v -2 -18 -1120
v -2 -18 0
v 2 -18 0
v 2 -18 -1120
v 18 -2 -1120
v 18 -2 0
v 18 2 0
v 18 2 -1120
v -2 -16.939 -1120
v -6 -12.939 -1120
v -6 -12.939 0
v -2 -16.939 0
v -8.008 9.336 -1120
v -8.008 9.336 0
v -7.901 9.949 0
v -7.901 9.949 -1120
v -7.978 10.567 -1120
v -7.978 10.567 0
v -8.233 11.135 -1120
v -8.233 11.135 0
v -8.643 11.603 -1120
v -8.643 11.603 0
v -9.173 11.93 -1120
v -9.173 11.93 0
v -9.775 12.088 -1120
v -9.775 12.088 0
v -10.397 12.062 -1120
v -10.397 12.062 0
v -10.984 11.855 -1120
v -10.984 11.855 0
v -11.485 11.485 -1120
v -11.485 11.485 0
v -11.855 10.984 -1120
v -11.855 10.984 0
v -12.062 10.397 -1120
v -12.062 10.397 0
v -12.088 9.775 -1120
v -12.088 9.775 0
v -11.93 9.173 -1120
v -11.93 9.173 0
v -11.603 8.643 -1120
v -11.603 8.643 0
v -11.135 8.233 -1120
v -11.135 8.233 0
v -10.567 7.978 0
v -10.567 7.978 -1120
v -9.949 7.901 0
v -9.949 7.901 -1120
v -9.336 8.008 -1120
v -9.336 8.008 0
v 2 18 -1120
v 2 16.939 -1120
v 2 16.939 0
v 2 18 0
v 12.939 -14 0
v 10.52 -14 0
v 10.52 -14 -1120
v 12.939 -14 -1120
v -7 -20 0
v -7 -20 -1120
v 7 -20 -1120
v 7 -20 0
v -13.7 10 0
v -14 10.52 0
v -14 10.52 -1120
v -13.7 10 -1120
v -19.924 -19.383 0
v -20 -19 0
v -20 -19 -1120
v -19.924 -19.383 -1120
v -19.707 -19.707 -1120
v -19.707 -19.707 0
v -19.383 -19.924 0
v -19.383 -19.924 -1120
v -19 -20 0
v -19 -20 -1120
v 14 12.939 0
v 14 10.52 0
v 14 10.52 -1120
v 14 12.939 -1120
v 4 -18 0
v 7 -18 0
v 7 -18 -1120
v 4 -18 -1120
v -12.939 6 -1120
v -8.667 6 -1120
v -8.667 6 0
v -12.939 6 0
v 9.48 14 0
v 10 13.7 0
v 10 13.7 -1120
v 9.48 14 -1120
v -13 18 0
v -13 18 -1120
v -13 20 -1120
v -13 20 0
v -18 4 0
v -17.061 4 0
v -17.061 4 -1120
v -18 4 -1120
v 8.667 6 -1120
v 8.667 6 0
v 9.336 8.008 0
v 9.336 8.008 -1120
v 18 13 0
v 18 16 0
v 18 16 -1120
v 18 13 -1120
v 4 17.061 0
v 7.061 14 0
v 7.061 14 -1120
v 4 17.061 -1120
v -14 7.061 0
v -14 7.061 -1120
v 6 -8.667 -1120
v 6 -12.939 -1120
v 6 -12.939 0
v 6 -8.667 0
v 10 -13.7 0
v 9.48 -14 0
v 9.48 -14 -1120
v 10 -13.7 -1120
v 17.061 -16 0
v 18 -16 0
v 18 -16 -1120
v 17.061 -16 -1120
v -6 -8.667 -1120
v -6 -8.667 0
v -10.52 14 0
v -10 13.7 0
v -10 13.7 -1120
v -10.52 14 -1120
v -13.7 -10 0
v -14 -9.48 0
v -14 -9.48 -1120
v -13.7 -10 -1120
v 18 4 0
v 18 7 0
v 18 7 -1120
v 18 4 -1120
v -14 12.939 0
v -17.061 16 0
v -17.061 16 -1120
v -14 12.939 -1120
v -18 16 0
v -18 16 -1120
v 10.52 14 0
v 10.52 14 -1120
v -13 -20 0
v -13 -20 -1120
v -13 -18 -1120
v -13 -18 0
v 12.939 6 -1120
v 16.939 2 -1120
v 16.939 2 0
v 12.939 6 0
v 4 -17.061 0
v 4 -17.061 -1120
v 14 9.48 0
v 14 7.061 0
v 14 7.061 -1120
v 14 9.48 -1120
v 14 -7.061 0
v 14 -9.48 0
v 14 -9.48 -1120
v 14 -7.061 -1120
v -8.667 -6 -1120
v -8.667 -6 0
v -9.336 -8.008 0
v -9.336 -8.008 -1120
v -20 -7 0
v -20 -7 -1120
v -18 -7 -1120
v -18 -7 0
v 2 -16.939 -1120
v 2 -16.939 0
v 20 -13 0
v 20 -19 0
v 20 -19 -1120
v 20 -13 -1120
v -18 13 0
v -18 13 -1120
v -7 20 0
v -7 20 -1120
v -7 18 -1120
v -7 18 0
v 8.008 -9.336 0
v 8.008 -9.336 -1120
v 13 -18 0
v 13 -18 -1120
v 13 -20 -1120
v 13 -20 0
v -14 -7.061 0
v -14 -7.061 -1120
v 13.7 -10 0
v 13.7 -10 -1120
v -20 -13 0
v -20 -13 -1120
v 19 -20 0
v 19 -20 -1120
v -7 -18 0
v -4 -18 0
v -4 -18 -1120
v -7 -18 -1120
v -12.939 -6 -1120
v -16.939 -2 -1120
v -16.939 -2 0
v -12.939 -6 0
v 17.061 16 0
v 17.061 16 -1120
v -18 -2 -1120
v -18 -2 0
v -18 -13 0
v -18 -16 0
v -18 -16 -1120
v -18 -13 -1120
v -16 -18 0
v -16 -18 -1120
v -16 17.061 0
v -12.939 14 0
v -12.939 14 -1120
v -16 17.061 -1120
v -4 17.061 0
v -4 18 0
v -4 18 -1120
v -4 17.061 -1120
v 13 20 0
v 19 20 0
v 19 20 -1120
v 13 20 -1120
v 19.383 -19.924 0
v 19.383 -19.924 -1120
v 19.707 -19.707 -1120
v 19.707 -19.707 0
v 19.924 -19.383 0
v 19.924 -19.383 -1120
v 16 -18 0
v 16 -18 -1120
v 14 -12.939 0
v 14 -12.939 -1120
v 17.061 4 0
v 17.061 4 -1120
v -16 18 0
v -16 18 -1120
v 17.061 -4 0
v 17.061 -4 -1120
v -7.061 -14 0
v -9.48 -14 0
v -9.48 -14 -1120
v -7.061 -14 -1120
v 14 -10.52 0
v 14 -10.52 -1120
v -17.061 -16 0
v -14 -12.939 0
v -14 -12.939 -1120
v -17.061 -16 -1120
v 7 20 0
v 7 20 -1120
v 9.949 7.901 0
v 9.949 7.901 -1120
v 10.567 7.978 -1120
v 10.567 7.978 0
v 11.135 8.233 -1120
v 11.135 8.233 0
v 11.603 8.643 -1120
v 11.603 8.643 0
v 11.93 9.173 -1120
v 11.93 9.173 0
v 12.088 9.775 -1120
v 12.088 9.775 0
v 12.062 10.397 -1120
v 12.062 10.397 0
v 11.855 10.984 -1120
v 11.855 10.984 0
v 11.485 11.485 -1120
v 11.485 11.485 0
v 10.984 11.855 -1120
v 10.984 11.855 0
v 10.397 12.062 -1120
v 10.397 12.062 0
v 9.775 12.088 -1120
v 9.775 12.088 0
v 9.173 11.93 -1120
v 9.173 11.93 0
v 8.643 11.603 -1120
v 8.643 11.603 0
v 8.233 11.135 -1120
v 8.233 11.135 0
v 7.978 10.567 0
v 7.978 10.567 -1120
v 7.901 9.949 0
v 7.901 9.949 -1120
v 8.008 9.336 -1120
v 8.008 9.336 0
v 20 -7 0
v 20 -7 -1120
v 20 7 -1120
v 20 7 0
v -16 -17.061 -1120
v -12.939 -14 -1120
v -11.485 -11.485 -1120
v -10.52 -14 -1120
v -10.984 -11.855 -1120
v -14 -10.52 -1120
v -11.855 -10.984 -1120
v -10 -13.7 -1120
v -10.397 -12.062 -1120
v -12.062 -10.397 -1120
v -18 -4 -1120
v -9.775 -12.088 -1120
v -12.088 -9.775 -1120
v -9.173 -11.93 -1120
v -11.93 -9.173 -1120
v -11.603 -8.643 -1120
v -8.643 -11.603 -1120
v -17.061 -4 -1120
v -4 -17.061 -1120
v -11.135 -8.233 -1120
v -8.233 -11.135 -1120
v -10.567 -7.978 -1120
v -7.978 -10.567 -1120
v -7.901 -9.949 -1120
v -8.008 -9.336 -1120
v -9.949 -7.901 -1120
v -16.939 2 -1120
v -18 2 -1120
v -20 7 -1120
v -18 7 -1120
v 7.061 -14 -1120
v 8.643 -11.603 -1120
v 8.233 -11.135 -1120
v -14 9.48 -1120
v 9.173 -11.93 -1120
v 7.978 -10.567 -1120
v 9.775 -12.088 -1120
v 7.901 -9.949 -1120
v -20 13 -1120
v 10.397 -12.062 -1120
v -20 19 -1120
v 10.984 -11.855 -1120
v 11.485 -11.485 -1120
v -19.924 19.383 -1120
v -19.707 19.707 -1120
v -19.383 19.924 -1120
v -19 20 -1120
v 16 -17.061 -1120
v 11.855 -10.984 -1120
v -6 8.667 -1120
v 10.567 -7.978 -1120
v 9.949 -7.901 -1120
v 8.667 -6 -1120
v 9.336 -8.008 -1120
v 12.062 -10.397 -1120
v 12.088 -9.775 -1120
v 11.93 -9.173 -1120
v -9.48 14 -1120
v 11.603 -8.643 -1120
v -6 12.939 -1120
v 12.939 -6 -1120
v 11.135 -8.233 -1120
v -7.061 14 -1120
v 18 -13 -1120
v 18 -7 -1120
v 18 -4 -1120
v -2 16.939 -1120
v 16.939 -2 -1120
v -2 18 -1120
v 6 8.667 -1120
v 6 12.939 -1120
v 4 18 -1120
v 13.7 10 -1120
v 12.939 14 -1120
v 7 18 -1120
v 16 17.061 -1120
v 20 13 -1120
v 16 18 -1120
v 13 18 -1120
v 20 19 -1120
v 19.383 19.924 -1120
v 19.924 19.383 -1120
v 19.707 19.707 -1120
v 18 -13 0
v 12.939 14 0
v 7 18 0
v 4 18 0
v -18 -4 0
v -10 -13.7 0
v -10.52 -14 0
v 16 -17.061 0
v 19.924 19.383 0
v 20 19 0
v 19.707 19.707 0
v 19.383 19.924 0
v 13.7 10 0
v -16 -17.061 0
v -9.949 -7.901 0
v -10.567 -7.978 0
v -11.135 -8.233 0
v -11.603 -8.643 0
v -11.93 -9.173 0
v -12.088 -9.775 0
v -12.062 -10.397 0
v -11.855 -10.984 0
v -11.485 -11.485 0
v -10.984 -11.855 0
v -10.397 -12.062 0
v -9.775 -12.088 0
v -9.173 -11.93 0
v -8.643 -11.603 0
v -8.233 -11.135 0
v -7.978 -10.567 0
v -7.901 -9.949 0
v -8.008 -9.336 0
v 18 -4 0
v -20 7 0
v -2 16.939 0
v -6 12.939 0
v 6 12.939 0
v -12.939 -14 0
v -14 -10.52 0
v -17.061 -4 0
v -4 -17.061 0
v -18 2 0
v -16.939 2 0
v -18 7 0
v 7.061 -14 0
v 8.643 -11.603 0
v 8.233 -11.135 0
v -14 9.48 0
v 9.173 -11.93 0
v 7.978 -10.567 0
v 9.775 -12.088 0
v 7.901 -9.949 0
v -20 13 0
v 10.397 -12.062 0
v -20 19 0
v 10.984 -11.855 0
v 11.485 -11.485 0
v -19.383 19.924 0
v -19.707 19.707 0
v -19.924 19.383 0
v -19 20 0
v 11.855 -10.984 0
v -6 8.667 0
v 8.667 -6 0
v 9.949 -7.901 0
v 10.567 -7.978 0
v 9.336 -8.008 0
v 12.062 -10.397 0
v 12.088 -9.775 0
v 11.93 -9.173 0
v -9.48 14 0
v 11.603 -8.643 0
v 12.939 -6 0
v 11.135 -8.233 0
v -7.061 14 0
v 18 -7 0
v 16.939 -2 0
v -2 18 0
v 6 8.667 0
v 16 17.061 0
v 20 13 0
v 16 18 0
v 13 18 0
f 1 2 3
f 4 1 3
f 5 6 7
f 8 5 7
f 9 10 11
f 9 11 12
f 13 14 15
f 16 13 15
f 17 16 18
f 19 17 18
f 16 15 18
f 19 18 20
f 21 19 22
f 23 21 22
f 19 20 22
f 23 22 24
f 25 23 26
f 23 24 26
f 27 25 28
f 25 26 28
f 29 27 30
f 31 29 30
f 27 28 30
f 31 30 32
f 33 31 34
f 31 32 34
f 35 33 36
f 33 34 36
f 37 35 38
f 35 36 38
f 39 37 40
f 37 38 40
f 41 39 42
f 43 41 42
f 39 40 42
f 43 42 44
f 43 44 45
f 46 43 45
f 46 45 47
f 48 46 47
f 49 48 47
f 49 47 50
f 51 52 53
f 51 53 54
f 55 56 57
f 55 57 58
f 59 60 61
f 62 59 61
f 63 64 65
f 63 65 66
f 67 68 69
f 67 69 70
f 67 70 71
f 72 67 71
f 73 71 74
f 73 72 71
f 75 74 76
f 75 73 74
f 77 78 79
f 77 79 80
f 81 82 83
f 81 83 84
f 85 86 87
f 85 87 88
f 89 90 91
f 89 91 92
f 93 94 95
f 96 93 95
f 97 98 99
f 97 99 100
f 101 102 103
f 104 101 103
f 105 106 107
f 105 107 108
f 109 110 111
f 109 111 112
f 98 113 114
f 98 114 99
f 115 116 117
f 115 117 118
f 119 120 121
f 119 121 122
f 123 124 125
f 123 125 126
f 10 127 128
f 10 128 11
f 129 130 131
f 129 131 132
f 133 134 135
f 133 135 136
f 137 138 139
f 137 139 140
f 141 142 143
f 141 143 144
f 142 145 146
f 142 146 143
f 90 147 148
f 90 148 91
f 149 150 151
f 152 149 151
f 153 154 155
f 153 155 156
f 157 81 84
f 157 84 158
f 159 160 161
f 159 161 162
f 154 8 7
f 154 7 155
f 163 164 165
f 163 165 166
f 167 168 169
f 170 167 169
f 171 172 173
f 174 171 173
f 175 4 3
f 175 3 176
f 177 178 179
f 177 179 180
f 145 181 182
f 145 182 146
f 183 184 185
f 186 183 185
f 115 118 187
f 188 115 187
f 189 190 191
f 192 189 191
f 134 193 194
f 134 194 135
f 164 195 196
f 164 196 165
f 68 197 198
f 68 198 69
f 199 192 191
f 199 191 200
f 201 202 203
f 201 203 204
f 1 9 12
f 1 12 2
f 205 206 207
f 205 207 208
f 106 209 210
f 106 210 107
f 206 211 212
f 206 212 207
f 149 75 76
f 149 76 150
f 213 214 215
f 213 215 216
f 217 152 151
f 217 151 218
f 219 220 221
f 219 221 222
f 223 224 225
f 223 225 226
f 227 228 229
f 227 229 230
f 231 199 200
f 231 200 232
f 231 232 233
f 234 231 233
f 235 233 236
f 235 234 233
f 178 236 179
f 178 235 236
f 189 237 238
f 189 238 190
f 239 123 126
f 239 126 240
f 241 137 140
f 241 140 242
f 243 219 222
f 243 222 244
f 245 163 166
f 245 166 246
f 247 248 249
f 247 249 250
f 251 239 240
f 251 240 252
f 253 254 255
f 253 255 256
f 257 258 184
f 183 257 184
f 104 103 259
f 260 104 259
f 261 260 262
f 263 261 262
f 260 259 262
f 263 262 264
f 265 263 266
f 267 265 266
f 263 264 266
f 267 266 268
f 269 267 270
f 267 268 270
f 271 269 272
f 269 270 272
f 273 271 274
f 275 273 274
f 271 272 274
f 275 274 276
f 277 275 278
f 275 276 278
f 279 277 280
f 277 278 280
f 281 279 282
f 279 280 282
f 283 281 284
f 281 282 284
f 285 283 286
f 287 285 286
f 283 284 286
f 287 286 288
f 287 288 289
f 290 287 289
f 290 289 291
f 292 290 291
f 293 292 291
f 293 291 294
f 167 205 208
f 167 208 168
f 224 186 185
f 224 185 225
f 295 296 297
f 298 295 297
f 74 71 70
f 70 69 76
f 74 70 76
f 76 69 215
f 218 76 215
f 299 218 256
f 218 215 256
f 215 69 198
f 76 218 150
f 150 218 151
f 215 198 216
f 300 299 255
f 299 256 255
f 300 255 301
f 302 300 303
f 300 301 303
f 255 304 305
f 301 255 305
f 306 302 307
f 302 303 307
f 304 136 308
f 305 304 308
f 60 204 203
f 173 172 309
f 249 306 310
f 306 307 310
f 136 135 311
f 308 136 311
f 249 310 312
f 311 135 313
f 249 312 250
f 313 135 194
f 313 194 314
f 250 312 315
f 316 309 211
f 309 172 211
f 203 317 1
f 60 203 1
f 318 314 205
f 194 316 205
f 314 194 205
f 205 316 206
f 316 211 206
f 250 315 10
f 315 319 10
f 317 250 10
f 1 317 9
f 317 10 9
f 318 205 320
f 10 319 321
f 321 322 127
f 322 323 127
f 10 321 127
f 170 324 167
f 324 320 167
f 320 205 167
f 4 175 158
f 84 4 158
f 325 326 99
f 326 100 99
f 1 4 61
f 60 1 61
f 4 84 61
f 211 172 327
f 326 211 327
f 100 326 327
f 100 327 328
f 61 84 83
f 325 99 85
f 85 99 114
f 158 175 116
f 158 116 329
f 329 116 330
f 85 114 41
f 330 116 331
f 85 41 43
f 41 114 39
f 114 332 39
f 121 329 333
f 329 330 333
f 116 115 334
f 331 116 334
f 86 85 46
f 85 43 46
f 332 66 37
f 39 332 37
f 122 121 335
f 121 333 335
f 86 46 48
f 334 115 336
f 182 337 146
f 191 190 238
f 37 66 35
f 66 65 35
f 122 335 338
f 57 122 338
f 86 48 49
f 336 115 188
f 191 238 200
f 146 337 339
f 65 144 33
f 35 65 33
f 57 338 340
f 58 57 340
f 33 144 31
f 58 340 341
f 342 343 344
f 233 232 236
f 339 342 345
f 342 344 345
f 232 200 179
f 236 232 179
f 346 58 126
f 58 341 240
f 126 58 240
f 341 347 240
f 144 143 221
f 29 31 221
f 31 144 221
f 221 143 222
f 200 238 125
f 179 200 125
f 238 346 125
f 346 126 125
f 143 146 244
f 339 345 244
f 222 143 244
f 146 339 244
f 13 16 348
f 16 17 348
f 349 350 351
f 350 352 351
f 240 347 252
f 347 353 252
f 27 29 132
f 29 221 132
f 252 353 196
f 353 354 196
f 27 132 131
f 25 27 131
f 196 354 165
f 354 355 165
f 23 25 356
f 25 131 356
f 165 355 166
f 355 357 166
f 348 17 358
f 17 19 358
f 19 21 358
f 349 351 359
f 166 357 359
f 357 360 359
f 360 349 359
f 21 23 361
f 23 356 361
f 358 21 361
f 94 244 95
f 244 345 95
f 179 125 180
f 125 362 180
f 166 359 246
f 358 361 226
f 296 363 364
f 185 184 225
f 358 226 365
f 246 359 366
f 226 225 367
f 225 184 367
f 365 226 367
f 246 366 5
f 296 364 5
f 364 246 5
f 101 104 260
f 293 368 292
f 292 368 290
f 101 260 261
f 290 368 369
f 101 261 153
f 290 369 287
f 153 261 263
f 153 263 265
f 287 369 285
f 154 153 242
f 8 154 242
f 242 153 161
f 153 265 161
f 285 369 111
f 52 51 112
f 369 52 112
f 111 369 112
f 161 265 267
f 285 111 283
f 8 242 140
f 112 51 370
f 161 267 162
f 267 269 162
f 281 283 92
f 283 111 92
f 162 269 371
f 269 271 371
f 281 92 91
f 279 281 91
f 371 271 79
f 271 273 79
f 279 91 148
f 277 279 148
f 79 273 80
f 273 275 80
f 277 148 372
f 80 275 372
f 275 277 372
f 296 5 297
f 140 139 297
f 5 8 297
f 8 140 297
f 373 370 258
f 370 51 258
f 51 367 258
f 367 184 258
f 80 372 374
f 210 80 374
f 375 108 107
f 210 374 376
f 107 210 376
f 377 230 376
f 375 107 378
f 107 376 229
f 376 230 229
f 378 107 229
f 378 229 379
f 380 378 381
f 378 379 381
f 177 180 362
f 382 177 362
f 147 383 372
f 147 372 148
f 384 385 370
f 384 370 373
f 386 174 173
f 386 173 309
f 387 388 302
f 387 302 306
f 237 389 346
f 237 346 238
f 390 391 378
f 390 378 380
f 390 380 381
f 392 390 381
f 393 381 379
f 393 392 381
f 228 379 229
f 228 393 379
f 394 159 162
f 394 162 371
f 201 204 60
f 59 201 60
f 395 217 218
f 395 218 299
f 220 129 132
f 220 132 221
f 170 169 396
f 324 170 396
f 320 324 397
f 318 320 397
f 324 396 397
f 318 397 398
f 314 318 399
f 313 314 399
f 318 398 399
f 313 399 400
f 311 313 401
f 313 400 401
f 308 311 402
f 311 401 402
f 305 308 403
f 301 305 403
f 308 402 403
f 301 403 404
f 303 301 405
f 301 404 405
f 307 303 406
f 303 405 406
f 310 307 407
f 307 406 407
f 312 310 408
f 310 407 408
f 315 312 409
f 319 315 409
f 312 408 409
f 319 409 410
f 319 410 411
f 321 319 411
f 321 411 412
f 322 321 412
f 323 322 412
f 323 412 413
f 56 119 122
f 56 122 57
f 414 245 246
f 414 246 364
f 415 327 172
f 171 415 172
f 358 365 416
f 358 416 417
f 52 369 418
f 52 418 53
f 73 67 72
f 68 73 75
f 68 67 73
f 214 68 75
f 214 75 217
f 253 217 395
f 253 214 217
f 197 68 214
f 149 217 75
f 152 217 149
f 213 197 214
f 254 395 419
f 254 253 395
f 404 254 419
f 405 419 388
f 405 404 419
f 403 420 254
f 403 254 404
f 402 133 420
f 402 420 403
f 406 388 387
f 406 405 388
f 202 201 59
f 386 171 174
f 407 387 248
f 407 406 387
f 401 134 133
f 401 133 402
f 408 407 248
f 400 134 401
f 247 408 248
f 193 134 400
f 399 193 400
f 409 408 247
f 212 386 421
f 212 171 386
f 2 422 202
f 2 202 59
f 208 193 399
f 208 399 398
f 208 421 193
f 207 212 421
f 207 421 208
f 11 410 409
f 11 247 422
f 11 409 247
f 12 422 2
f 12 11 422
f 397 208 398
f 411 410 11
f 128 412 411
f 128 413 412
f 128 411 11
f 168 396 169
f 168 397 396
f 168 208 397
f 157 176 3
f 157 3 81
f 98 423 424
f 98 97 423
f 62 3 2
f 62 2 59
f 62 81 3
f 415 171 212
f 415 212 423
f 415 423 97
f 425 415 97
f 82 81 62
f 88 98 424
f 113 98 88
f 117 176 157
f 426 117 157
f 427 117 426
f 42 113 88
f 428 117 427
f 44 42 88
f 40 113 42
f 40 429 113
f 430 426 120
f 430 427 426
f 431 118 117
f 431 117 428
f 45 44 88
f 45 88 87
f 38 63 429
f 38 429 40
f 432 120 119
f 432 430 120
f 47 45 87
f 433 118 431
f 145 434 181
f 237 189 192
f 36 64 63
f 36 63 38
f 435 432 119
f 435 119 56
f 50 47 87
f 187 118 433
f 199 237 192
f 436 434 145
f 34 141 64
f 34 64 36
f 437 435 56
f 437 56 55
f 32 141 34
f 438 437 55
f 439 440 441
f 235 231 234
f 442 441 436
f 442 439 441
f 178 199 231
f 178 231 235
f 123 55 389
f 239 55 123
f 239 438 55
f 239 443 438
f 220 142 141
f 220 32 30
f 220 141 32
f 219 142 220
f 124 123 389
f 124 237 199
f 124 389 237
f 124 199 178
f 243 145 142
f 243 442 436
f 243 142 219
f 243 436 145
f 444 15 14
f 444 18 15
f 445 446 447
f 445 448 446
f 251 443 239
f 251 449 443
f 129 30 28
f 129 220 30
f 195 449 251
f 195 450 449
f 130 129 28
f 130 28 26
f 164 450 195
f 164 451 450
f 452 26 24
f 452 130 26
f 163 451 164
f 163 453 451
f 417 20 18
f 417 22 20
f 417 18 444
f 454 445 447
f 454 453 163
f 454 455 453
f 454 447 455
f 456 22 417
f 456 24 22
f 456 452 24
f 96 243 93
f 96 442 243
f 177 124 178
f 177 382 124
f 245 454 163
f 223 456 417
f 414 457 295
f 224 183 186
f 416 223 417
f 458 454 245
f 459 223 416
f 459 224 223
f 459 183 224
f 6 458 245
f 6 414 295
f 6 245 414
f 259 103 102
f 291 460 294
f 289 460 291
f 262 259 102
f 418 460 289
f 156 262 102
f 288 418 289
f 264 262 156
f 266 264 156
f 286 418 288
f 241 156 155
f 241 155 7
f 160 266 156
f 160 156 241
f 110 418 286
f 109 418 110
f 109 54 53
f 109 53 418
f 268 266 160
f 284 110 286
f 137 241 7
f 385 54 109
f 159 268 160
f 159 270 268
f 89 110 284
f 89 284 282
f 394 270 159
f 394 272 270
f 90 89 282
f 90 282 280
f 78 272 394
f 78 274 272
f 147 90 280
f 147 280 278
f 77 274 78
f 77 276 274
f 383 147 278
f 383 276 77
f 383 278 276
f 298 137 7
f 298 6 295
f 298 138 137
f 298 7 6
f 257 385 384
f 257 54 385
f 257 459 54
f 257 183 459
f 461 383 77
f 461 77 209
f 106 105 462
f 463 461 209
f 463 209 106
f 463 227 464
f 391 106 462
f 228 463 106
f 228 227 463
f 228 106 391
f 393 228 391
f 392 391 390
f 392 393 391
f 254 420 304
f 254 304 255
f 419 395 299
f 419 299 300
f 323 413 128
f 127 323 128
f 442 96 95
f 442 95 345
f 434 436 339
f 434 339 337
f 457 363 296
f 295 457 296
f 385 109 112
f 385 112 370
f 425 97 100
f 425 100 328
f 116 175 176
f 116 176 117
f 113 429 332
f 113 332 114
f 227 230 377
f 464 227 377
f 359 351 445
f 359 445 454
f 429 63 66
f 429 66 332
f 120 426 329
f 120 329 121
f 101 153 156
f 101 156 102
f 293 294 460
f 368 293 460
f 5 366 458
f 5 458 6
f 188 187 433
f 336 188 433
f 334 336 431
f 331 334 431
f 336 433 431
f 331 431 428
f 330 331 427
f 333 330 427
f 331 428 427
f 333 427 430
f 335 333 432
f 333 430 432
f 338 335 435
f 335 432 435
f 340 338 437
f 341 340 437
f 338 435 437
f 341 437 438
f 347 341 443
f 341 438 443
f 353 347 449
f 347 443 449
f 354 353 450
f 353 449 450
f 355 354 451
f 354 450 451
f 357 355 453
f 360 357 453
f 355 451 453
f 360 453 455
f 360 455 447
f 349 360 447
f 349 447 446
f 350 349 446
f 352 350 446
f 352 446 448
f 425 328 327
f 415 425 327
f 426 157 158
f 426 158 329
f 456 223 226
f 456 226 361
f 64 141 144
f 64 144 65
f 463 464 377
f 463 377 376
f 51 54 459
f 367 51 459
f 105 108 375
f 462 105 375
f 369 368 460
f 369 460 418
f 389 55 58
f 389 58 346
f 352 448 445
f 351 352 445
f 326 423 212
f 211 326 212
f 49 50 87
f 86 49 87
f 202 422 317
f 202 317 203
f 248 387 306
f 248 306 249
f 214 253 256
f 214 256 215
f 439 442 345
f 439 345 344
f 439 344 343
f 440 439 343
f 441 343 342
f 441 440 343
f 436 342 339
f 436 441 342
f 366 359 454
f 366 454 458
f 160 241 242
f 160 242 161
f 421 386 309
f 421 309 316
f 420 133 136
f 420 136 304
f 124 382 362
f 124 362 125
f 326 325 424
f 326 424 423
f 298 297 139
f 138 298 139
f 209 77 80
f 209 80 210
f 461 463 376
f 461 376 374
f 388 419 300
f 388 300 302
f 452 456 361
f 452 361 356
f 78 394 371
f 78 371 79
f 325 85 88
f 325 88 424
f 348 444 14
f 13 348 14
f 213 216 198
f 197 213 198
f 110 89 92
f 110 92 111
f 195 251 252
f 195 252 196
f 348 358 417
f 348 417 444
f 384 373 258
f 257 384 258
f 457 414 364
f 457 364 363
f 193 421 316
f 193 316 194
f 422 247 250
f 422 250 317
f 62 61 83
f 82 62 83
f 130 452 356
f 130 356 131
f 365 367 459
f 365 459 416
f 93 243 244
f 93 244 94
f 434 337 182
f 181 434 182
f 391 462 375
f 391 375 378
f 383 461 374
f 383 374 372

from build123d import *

# Parameters (mm, degrees)
BOSS_EXTRUDE1_DEPTH = 1120
CUT_EXTRUDE1_DEPTH  = 1182


with BuildPart() as part:
    # Sketch1 → Boss-Extrude1 (new body)
    with BuildSketch(Plane.XY):
        with BuildLine():
            Line((-20, 13), (-18, 13))
            Line((-18, 13), (-18, 16))
            Line((-18, 16), (-17.060660172, 16))
            Line((-17.060660172, 16), (-14, 12.939339828))
            Line((-14, 12.939339828), (-14, 10.519615242))
            Line((-14, 10.519615242), (-13.7, 10))
            Line((-13.7, 10), (-14, 9.480384758))
            Line((-14, 9.480384758), (-14, 7.060660172))
            Line((-14, 7.060660172), (-17.060660172, 4))
            Line((-17.060660172, 4), (-18, 4))
            Line((-18, 4), (-18, 7))
            Line((-18, 7), (-20, 7))
            Line((-20, 7), (-20, -7))
            Line((-20, -7), (-18, -7))
            Line((-18, -7), (-18, -4))
            Line((-18, -4), (-17.060660172, -4))
            Line((-17.060660172, -4), (-14, -7.060660172))
            Line((-14, -7.060660172), (-14, -9.480384758))
            Line((-14, -9.480384758), (-13.7, -10))
            Line((-13.7, -10), (-14, -10.519615242))
            Line((-14, -10.519615242), (-14, -12.939339828))
            Line((-14, -12.939339828), (-17.060660172, -16))
            Line((-17.060660172, -16), (-18, -16))
            Line((-18, -16), (-18, -13))
            Line((-18, -13), (-20, -13))
            Line((-20, -13), (-20, -19))
            ThreePointArc((-20, -19), (-19.707106781, -19.707106781), (-19, -20))
            Line((-19, -20), (-13, -20))
            Line((-13, -20), (-13, -18))
            Line((-13, -18), (-16, -18))
            Line((-16, -18), (-16, -17.060660172))
            Line((-16, -17.060660172), (-12.939339828, -14))
            Line((-12.939339828, -14), (-10.519615242, -14))
            Line((-10.519615242, -14), (-10, -13.7))
            Line((-10, -13.7), (-9.480384758, -14))
            Line((-9.480384758, -14), (-7.060660172, -14))
            Line((-7.060660172, -14), (-4, -17.060660172))
            Line((-4, -17.060660172), (-4, -18))
            Line((-4, -18), (-7, -18))
            Line((-7, -18), (-7, -20))
            Line((-7, -20), (7, -20))
            Line((7, -20), (7, -18))
            Line((7, -18), (4, -18))
            Line((4, -18), (4, -17.060660172))
            Line((4, -17.060660172), (7.060660172, -14))
            Line((7.060660172, -14), (9.480384758, -14))
            Line((9.480384758, -14), (10, -13.7))
            Line((10, -13.7), (10.519615242, -14))
            Line((10.519615242, -14), (12.939339828, -14))
            Line((12.939339828, -14), (16, -17.060660172))
            Line((16, -17.060660172), (16, -18))
            Line((16, -18), (13, -18))
            Line((13, -18), (13, -20))
            Line((13, -20), (19, -20))
            ThreePointArc((19, -20), (19.707106781, -19.707106781), (20, -19))
            Line((20, -19), (20, -13))
            Line((20, -13), (18, -13))
            Line((18, -13), (18, -16))
            Line((18, -16), (17.060660172, -16))
            Line((17.060660172, -16), (14, -12.939339828))
            Line((14, -12.939339828), (14, -10.519615242))
            Line((14, -10.519615242), (13.7, -10))
            Line((13.7, -10), (14, -9.480384758))
            Line((14, -9.480384758), (14, -7.060660172))
            Line((14, -7.060660172), (17.060660172, -4))
            Line((17.060660172, -4), (18, -4))
            Line((18, -4), (18, -7))
            Line((18, -7), (20, -7))
            Line((20, -7), (20, 7))
            Line((20, 7), (18, 7))
            Line((18, 7), (18, 4))
            Line((18, 4), (17.060660172, 4))
            Line((17.060660172, 4), (14, 7.060660172))
            Line((14, 7.060660172), (14, 9.480384758))
            Line((14, 9.480384758), (13.7, 10))
            Line((13.7, 10), (14, 10.519615242))
            Line((14, 10.519615242), (14, 12.939339828))
            Line((14, 12.939339828), (17.060660172, 16))
            Line((17.060660172, 16), (18, 16))
            Line((18, 16), (18, 13))
            Line((18, 13), (20, 13))
            Line((20, 13), (20, 19))
            ThreePointArc((20, 19), (19.707106781, 19.707106781), (19, 20))
            Line((19, 20), (13, 20))
            Line((13, 20), (13, 18))
            Line((13, 18), (16, 18))
            Line((16, 18), (16, 17.060660172))
            Line((16, 17.060660172), (12.939339828, 14))
            Line((12.939339828, 14), (10.519615242, 14))
            Line((10.519615242, 14), (10, 13.7))
            Line((10, 13.7), (9.480384758, 14))
            Line((9.480384758, 14), (7.060660172, 14))
            Line((7.060660172, 14), (4, 17.060660172))
            Line((4, 17.060660172), (4, 18))
            Line((4, 18), (7, 18))
            Line((7, 18), (7, 20))
            Line((7, 20), (-7, 20))
            Line((-7, 20), (-7, 18))
            Line((-7, 18), (-4, 18))
            Line((-4, 18), (-4, 17.060660172))
            Line((-4, 17.060660172), (-7.060660172, 14))
            Line((-7.060660172, 14), (-9.480384758, 14))
            Line((-9.480384758, 14), (-10, 13.7))
            Line((-10, 13.7), (-10.519615242, 14))
            Line((-10.519615242, 14), (-12.939339828, 14))
            Line((-12.939339828, 14), (-16, 17.060660172))
            Line((-16, 17.060660172), (-16, 18))
            Line((-16, 18), (-13, 18))
            Line((-13, 18), (-13, 20))
            Line((-13, 20), (-19, 20))
            ThreePointArc((-19, 20), (-19.707106781, 19.707106781), (-20, 19))
            Line((-20, 19), (-20, 13))
        make_face()
    extrude(amount=-BOSS_EXTRUDE1_DEPTH)

    # Sketch2 → Cut-Extrude1 (cut)
    with BuildSketch(Plane.XY):
        with BuildLine():
            Line((-18, 2), (-18, -2))
            Line((-18, -2), (-16.939339828, -2))
            Line((-16.939339828, -2), (-12.939339828, -6))
            Line((-12.939339828, -6), (-8.666662697, -6))
            Line((-8.666662697, -6), (-9.335919912, -8.007765667))
            ThreePointArc((-9.335919912, -8.007765667), (-11.48492424, -11.48492424), (-8.007765667, -9.335919912))
            Line((-8.007765667, -9.335919912), (-6, -8.666662697))
            Line((-6, -8.666662697), (-6, -12.939339828))
            Line((-6, -12.939339828), (-2, -16.939339828))
            Line((-2, -16.939339828), (-2, -18))
            Line((-2, -18), (2, -18))
            Line((2, -18), (2, -16.939339828))
            Line((2, -16.939339828), (6, -12.939339828))
            Line((6, -12.939339828), (6, -8.666662697))
            Line((6, -8.666662697), (8.007765667, -9.335919912))
            ThreePointArc((8.007765667, -9.335919912), (11.48492424, -11.48492424), (9.335919912, -8.007765667))
            Line((9.335919912, -8.007765667), (8.666662697, -6))
            Line((8.666662697, -6), (12.939339828, -6))
            Line((12.939339828, -6), (16.939339828, -2))
            Line((16.939339828, -2), (18, -2))
            Line((18, -2), (18, 2))
            Line((18, 2), (16.939339828, 2))
            Line((16.939339828, 2), (12.939339828, 6))
            Line((12.939339828, 6), (8.666662697, 6))
            Line((8.666662697, 6), (9.335919912, 8.007765667))
            ThreePointArc((9.335919912, 8.007765667), (11.48492424, 11.48492424), (8.007765667, 9.335919912))
            Line((8.007765667, 9.335919912), (6, 8.666662697))
            Line((6, 8.666662697), (6, 12.939339828))
            Line((6, 12.939339828), (2, 16.939339828))
            Line((2, 16.939339828), (2, 18))
            Line((2, 18), (-2, 18))
            Line((-2, 18), (-2, 16.939339828))
            Line((-2, 16.939339828), (-6, 12.939339828))
            Line((-6, 12.939339828), (-6, 8.666662697))
            Line((-6, 8.666662697), (-8.007765667, 9.335919912))
            ThreePointArc((-8.007765667, 9.335919912), (-11.48492424, 11.48492424), (-9.335919912, 8.007765667))
            Line((-9.335919912, 8.007765667), (-8.666662697, 6))
            Line((-8.666662697, 6), (-12.939339828, 6))
            Line((-12.939339828, 6), (-16.939339828, 2))
            Line((-16.939339828, 2), (-18, 2))
        make_face()
    extrude(amount=-CUT_EXTRUDE1_DEPTH, mode=Mode.SUBTRACT)


solid = part.part
